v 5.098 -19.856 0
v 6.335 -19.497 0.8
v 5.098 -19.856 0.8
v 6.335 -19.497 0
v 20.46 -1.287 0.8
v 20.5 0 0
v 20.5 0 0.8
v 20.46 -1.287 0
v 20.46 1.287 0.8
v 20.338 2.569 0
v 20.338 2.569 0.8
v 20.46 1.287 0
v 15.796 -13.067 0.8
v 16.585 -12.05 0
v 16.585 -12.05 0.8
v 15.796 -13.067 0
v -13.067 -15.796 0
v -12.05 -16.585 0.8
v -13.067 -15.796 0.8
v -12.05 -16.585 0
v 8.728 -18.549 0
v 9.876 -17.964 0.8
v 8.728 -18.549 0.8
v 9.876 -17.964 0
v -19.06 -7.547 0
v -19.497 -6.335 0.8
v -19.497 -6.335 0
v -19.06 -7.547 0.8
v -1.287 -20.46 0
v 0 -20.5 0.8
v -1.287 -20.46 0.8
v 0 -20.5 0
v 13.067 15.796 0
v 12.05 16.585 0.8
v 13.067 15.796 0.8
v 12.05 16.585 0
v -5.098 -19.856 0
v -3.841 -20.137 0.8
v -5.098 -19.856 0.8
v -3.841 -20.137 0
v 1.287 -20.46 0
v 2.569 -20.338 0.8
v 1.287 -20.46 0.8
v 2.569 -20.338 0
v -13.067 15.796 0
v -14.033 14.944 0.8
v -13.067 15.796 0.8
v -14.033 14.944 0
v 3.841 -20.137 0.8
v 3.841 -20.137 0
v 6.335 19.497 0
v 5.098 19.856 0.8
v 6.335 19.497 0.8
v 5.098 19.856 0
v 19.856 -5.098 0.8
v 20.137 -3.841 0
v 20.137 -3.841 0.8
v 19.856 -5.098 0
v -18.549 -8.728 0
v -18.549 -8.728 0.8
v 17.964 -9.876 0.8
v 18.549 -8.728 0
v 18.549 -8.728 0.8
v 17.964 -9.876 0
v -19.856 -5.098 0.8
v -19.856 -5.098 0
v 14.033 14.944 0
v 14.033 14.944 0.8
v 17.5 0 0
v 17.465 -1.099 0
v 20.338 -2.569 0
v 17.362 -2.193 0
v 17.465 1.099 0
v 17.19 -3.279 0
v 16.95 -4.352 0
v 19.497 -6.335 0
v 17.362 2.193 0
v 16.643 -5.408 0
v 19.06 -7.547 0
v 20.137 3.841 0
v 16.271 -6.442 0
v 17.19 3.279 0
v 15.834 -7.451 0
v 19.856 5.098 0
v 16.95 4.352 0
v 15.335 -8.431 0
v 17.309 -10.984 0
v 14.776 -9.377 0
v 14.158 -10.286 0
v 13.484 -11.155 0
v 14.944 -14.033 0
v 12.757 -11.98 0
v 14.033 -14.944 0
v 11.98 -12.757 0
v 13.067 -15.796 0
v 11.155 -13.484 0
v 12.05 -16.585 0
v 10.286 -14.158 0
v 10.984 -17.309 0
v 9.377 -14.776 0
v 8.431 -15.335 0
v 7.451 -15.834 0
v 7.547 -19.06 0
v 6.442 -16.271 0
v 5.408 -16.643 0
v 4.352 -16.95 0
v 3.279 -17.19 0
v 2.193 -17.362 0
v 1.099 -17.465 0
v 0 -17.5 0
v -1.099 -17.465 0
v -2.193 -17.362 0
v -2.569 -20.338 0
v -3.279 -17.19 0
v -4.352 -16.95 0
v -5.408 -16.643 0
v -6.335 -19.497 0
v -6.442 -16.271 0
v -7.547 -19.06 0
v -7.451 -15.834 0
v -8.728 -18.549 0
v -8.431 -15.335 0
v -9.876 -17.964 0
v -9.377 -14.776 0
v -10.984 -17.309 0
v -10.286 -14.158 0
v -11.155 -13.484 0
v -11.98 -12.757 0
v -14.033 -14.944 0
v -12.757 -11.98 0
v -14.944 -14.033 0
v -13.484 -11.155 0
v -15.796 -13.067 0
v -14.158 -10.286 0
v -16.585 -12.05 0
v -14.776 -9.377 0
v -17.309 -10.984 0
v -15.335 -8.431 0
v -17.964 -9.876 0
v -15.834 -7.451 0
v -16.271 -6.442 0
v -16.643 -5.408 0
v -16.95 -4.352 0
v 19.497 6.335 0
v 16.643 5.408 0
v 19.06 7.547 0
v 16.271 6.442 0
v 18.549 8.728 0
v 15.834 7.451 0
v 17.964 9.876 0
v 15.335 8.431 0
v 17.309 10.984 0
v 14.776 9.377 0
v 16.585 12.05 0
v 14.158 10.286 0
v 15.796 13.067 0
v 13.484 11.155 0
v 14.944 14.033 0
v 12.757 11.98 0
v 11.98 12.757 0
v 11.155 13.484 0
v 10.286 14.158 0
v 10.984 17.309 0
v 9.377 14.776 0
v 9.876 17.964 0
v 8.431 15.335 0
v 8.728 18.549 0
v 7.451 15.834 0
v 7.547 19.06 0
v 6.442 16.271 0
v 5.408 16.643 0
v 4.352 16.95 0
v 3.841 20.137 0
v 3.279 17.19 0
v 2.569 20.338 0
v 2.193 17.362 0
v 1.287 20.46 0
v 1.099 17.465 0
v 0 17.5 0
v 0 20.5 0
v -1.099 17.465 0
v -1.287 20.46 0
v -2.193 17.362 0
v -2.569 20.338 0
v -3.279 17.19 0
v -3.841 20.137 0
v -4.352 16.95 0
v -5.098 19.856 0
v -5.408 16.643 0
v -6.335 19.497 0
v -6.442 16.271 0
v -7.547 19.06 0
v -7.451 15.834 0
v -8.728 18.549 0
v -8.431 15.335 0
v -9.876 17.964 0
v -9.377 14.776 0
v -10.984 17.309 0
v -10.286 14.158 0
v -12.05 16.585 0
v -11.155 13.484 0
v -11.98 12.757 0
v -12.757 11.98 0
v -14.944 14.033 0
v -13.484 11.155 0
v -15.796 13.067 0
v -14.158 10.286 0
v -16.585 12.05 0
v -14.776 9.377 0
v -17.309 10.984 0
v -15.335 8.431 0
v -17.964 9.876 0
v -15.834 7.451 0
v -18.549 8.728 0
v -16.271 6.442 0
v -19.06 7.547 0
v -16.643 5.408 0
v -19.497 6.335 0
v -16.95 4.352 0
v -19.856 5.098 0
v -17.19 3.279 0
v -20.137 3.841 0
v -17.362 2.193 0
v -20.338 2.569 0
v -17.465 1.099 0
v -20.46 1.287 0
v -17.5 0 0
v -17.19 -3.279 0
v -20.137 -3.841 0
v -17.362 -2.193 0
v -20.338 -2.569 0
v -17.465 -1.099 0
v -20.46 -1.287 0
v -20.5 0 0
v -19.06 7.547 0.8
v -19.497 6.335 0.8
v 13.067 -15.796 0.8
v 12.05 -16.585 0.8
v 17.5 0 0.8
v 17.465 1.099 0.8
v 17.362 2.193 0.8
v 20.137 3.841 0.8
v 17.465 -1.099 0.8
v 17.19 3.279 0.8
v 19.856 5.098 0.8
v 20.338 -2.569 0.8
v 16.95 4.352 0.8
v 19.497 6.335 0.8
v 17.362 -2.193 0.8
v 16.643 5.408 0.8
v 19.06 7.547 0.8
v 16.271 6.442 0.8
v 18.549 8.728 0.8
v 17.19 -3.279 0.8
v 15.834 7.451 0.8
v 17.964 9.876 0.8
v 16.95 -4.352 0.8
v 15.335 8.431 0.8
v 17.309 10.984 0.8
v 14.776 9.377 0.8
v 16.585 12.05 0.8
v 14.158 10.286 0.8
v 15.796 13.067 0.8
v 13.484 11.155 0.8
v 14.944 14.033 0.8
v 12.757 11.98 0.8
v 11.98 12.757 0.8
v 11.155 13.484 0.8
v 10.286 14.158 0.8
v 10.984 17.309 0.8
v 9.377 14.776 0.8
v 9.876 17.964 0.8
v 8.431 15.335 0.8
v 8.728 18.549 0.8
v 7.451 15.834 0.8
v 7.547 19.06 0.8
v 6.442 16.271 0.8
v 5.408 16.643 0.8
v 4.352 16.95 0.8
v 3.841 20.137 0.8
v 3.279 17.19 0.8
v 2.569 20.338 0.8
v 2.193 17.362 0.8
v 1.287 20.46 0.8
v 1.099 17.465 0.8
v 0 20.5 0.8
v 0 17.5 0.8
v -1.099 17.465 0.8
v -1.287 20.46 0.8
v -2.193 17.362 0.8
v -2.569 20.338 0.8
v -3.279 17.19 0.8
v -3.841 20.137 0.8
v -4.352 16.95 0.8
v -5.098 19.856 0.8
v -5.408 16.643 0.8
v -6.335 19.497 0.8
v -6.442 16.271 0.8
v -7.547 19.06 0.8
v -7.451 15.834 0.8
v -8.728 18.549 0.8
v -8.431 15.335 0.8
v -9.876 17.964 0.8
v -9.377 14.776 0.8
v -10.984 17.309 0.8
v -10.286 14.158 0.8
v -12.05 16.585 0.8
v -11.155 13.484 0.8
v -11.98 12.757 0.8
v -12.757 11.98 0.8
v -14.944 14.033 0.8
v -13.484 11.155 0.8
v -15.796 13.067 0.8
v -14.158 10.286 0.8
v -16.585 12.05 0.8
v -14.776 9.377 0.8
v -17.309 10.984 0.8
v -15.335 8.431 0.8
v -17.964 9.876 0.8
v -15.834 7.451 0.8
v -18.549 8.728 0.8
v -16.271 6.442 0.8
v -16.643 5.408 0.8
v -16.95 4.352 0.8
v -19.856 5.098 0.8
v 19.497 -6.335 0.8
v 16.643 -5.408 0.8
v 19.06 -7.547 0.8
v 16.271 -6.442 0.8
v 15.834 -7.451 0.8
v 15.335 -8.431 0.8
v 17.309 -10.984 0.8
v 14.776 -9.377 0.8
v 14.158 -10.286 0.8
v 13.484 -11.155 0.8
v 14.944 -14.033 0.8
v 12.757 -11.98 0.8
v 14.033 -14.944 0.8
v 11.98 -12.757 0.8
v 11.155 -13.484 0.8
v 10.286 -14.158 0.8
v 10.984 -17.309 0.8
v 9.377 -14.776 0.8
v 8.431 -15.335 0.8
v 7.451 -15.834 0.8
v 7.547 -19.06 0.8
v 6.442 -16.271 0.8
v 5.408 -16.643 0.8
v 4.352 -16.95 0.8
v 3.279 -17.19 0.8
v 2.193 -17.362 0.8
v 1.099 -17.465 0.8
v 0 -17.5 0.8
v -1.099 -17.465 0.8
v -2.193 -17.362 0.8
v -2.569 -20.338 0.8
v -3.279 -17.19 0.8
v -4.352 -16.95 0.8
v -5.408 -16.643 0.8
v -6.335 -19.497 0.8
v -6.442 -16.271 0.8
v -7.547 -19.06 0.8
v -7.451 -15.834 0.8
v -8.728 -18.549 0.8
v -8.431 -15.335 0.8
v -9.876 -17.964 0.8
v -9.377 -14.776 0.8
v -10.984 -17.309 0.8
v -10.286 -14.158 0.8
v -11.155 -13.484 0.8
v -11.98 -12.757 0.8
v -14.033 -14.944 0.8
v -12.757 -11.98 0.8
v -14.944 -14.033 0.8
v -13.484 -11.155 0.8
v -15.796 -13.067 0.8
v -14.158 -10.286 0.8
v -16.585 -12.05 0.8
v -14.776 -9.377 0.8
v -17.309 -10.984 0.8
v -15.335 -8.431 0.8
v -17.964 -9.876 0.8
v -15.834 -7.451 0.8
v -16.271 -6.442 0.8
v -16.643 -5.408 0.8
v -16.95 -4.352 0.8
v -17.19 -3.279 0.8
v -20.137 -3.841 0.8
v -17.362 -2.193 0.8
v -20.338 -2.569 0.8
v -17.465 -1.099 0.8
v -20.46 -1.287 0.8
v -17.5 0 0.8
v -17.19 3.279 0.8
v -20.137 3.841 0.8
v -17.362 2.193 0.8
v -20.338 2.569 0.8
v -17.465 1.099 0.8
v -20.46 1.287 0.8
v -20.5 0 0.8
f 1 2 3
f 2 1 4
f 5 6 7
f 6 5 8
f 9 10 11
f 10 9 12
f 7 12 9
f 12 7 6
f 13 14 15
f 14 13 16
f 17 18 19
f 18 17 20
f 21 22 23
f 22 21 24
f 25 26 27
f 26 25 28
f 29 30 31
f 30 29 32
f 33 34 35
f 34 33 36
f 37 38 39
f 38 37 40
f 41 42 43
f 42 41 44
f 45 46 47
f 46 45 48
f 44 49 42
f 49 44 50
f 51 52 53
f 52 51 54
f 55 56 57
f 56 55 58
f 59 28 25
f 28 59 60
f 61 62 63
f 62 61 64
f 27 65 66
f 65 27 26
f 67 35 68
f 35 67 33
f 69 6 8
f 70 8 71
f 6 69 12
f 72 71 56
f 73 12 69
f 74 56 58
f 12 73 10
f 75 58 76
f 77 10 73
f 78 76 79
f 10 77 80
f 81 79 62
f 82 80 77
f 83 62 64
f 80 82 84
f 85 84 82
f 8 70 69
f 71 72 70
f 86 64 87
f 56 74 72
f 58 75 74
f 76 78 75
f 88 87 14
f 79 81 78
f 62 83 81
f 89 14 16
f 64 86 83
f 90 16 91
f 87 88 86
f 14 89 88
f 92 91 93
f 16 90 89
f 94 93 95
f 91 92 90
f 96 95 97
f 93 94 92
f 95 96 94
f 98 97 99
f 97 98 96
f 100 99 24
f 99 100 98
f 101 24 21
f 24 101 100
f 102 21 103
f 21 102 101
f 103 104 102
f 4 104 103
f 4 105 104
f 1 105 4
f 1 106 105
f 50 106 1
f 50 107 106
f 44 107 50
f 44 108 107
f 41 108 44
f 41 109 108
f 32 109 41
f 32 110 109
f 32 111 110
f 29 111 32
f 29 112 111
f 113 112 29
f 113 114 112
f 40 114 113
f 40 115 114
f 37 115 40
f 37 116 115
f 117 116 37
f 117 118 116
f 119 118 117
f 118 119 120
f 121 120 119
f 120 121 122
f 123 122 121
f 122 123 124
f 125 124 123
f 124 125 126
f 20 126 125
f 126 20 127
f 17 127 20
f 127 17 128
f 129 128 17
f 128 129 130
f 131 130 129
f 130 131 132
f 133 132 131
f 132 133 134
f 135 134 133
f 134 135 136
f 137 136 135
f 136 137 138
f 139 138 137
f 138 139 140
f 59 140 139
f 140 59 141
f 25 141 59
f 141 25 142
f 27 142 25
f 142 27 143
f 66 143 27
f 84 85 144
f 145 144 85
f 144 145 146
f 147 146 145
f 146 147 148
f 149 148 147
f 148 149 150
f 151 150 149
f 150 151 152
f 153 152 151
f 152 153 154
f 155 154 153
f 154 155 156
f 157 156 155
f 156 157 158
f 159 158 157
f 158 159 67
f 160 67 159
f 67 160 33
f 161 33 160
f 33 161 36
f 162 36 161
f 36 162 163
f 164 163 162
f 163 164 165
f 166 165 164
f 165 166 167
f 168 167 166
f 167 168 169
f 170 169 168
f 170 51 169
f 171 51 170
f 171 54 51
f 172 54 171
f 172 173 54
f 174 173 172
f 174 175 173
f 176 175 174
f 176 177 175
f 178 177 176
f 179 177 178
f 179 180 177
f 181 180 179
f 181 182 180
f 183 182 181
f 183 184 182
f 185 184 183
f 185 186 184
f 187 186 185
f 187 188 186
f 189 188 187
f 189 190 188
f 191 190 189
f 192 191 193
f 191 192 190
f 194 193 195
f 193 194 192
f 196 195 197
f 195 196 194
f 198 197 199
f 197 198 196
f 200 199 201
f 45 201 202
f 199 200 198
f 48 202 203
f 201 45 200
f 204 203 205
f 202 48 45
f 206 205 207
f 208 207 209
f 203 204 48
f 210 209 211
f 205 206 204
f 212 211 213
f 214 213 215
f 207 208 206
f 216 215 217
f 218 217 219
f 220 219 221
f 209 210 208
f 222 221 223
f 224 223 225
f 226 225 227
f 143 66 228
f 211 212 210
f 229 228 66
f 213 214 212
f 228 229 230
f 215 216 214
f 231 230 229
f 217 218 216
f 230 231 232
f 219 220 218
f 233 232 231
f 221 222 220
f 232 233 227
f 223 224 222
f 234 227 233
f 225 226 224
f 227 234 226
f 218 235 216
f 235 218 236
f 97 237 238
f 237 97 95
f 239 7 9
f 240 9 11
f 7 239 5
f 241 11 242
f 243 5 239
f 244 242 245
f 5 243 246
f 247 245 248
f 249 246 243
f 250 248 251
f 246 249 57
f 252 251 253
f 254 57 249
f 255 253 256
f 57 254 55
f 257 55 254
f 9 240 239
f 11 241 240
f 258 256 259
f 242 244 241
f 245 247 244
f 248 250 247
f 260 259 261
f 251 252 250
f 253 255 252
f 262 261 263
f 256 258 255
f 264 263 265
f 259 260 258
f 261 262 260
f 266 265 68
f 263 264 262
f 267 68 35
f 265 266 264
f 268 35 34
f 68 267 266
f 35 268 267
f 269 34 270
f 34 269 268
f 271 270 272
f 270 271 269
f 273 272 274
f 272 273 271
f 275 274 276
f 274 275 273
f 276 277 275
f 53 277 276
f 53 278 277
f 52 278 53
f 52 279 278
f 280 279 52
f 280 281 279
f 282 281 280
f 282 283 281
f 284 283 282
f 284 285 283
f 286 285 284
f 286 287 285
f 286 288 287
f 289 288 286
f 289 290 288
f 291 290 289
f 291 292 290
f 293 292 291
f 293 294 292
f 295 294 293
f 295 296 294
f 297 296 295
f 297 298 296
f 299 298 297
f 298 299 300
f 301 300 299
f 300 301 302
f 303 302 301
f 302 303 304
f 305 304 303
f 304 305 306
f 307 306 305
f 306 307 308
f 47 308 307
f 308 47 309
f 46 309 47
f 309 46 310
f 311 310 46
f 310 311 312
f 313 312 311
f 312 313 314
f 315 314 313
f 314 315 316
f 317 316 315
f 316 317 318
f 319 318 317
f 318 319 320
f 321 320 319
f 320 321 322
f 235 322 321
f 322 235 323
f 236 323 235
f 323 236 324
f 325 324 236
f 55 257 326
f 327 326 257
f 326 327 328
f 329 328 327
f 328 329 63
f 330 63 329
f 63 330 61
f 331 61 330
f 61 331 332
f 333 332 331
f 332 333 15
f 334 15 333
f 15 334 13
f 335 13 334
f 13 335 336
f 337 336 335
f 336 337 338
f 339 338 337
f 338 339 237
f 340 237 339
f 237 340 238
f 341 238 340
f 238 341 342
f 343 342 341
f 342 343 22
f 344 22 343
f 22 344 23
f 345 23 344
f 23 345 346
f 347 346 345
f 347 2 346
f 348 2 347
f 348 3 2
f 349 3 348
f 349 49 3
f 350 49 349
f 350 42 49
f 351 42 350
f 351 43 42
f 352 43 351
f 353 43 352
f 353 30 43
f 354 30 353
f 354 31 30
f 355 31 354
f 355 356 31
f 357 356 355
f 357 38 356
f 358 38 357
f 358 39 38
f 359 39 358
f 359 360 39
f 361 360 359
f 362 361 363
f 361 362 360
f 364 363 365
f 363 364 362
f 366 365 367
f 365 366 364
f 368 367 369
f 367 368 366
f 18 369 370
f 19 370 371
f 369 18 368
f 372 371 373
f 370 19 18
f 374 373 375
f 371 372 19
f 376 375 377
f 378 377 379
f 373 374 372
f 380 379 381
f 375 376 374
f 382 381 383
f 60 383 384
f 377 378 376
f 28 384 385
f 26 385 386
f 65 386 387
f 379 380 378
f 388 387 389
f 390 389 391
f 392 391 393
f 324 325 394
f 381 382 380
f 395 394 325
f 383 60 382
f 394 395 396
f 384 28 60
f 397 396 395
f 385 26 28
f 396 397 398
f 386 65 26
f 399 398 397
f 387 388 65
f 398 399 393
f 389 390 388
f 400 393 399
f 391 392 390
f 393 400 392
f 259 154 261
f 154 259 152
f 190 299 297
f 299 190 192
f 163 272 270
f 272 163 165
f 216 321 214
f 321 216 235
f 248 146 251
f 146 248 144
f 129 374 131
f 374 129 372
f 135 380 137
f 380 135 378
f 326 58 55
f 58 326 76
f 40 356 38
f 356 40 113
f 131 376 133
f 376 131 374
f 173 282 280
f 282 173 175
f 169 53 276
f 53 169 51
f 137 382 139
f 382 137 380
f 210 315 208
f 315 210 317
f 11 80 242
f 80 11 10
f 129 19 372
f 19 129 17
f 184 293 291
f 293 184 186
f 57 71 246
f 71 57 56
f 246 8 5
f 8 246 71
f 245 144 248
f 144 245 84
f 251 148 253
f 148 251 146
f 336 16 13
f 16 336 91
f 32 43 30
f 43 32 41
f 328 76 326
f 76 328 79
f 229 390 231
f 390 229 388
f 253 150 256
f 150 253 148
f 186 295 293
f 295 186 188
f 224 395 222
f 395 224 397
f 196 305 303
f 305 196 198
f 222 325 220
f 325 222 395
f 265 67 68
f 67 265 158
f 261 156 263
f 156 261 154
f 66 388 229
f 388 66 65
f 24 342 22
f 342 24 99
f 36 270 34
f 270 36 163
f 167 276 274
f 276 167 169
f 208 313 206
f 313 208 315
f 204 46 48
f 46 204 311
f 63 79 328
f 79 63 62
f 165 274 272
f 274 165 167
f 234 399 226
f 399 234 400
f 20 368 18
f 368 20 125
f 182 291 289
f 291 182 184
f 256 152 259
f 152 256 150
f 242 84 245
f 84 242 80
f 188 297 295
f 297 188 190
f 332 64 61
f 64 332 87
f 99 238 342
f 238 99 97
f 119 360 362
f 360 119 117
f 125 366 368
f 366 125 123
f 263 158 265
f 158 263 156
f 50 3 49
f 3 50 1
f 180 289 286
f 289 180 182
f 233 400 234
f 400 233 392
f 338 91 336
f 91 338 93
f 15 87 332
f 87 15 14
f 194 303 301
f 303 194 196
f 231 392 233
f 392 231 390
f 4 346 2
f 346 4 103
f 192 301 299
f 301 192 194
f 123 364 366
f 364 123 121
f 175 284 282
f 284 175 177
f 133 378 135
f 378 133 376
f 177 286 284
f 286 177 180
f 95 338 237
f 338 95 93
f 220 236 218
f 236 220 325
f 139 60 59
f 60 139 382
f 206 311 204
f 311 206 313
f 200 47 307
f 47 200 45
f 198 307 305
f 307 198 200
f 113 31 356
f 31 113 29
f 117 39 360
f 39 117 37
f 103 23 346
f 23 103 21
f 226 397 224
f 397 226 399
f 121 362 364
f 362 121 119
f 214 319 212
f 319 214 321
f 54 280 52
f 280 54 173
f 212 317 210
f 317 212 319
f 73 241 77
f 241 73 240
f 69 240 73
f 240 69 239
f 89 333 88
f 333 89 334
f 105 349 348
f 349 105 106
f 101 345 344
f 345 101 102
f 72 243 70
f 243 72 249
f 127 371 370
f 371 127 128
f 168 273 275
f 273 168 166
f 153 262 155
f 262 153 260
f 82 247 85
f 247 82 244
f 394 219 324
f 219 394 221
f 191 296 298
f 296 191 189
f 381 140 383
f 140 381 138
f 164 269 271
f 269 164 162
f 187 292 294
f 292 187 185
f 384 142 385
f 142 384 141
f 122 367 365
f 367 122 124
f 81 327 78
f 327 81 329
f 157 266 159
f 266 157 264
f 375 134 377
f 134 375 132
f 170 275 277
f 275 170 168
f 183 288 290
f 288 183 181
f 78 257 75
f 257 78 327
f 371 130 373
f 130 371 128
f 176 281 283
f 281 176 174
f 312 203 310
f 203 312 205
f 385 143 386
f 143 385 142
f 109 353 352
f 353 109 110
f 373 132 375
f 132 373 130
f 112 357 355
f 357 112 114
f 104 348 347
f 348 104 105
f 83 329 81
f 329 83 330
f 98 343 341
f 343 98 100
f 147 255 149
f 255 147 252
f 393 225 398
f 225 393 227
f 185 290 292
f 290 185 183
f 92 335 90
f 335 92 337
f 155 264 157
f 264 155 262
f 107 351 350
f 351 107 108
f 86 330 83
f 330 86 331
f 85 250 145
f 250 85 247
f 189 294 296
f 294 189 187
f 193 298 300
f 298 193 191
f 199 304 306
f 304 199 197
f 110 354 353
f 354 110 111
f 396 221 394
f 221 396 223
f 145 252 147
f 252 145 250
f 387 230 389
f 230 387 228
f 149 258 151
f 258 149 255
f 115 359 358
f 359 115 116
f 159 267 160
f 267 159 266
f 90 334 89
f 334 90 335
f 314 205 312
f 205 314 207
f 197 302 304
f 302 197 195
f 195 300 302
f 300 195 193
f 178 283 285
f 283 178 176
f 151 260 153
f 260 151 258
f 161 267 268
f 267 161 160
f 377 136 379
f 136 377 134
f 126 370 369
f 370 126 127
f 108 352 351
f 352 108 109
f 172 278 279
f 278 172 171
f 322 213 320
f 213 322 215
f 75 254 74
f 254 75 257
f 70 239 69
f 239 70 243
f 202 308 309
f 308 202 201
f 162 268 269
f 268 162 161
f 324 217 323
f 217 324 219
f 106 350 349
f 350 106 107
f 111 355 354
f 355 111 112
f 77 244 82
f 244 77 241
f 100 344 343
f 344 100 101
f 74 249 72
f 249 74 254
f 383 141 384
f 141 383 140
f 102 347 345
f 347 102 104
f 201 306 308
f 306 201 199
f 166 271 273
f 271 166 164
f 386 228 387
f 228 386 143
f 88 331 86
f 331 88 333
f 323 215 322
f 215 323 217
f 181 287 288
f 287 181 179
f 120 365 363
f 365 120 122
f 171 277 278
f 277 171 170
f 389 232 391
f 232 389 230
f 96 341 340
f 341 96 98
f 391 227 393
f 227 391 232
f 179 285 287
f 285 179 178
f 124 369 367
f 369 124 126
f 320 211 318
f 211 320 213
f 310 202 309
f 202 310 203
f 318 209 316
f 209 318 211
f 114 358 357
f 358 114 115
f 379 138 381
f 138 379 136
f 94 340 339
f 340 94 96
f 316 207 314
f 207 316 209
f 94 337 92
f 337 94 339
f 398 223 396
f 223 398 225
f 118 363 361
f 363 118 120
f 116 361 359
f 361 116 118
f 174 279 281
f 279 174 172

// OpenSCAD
od = 41;
id = 35;
h = 0.8;
$fn = 100;

difference() {
    cylinder(d=od, h=h);
    cylinder(d=id, h=h);
}
